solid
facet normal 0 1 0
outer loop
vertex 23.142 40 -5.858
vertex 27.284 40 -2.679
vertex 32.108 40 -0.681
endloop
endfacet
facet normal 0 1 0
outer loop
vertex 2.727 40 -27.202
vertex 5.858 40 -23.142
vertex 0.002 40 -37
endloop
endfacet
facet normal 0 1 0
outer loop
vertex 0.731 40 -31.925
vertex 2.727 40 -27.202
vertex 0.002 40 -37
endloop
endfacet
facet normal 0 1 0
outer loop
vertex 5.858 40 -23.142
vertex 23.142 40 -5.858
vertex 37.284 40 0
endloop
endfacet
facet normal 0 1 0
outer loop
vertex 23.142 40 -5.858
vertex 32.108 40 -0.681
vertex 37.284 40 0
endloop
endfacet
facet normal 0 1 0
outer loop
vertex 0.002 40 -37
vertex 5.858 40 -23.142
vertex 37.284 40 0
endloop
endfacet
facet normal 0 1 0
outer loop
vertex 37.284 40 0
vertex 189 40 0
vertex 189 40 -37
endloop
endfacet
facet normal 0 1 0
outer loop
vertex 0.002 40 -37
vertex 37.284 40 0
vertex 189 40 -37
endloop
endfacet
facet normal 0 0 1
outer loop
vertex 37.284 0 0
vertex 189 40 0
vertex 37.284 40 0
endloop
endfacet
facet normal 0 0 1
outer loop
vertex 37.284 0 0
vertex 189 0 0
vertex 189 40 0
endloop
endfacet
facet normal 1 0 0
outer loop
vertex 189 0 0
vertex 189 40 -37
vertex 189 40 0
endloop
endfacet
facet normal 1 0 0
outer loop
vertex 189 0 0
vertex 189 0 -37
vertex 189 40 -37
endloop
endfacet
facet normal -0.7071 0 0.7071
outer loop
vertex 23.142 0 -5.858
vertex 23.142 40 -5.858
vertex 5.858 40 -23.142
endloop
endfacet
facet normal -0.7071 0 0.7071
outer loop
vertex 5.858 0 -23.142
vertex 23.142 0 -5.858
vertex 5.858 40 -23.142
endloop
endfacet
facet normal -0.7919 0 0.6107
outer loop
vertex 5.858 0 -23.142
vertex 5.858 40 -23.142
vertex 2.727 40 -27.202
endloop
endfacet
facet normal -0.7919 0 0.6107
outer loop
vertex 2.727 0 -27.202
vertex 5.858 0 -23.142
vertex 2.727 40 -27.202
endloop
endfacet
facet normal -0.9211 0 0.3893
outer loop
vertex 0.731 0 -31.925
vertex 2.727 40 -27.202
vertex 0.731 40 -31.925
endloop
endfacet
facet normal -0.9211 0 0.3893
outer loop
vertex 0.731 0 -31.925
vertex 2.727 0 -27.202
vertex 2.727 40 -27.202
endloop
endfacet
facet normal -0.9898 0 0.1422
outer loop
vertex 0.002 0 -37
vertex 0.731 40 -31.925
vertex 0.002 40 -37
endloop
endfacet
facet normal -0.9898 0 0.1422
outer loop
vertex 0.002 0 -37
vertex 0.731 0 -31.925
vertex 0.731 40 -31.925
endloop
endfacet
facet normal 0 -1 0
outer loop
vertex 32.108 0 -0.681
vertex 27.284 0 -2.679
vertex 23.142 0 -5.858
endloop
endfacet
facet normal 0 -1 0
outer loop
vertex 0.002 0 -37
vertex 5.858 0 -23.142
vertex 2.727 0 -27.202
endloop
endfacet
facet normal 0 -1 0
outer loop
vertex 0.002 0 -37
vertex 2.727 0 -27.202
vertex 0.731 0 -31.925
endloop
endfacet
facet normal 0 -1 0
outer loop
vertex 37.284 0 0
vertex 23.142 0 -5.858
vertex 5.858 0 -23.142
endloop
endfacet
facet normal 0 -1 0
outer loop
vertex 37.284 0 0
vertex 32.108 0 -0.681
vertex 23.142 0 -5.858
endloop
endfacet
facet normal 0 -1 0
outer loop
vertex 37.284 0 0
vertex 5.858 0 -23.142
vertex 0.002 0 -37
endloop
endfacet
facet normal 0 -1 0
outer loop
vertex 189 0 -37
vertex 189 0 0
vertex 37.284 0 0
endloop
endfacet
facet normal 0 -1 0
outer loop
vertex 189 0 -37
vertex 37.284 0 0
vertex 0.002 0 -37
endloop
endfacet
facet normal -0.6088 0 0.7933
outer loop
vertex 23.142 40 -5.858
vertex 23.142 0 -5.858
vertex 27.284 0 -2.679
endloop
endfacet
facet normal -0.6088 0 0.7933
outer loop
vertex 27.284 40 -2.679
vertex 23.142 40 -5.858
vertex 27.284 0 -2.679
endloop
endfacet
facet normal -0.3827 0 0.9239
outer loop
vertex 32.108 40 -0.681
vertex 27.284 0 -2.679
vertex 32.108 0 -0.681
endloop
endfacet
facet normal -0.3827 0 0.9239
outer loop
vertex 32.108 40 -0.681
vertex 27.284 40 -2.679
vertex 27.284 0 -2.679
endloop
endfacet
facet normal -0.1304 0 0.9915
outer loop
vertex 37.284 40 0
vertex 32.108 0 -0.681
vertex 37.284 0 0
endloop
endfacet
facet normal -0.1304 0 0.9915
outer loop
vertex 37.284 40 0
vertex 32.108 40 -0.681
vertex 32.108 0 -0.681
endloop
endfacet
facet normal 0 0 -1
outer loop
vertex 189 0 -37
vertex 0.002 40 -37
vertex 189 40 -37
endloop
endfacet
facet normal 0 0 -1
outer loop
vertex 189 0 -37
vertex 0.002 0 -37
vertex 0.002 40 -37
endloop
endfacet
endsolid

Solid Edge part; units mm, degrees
sketch "Sketch1" plane through (0, 0, 0) normal (0, -1, 0) x (1, 0, 0)
  line L0 (0, -37) -> (189, -37)
  line L1 (189, -37) -> (189, 0)
  line L2 (189, 0) -> (0, 0)
  line L3 (0, 0) -> (0, -37)
extrude "Protrusion1" add sketch "Sketch1" against normal blind 40
sketch "Sketch2" plane through (94.5, 0, -18.5) normal (0, -1, 0) x (1, 0, 0)
  line L0 (-65.5, 18.5) -> (-94.5, -10.5)
  line L1 (-94.5, -10.5) -> (-94.5, 18.5)
  line L2 (-94.5, 18.5) -> (-65.5, 18.5)
extrude "ExtrudedCutout_1" cut sketch "Sketch2" against normal blind 40
fillet "Round_1" radius 20 2 edges at (29, 20, 0) (0, 20, -29)
